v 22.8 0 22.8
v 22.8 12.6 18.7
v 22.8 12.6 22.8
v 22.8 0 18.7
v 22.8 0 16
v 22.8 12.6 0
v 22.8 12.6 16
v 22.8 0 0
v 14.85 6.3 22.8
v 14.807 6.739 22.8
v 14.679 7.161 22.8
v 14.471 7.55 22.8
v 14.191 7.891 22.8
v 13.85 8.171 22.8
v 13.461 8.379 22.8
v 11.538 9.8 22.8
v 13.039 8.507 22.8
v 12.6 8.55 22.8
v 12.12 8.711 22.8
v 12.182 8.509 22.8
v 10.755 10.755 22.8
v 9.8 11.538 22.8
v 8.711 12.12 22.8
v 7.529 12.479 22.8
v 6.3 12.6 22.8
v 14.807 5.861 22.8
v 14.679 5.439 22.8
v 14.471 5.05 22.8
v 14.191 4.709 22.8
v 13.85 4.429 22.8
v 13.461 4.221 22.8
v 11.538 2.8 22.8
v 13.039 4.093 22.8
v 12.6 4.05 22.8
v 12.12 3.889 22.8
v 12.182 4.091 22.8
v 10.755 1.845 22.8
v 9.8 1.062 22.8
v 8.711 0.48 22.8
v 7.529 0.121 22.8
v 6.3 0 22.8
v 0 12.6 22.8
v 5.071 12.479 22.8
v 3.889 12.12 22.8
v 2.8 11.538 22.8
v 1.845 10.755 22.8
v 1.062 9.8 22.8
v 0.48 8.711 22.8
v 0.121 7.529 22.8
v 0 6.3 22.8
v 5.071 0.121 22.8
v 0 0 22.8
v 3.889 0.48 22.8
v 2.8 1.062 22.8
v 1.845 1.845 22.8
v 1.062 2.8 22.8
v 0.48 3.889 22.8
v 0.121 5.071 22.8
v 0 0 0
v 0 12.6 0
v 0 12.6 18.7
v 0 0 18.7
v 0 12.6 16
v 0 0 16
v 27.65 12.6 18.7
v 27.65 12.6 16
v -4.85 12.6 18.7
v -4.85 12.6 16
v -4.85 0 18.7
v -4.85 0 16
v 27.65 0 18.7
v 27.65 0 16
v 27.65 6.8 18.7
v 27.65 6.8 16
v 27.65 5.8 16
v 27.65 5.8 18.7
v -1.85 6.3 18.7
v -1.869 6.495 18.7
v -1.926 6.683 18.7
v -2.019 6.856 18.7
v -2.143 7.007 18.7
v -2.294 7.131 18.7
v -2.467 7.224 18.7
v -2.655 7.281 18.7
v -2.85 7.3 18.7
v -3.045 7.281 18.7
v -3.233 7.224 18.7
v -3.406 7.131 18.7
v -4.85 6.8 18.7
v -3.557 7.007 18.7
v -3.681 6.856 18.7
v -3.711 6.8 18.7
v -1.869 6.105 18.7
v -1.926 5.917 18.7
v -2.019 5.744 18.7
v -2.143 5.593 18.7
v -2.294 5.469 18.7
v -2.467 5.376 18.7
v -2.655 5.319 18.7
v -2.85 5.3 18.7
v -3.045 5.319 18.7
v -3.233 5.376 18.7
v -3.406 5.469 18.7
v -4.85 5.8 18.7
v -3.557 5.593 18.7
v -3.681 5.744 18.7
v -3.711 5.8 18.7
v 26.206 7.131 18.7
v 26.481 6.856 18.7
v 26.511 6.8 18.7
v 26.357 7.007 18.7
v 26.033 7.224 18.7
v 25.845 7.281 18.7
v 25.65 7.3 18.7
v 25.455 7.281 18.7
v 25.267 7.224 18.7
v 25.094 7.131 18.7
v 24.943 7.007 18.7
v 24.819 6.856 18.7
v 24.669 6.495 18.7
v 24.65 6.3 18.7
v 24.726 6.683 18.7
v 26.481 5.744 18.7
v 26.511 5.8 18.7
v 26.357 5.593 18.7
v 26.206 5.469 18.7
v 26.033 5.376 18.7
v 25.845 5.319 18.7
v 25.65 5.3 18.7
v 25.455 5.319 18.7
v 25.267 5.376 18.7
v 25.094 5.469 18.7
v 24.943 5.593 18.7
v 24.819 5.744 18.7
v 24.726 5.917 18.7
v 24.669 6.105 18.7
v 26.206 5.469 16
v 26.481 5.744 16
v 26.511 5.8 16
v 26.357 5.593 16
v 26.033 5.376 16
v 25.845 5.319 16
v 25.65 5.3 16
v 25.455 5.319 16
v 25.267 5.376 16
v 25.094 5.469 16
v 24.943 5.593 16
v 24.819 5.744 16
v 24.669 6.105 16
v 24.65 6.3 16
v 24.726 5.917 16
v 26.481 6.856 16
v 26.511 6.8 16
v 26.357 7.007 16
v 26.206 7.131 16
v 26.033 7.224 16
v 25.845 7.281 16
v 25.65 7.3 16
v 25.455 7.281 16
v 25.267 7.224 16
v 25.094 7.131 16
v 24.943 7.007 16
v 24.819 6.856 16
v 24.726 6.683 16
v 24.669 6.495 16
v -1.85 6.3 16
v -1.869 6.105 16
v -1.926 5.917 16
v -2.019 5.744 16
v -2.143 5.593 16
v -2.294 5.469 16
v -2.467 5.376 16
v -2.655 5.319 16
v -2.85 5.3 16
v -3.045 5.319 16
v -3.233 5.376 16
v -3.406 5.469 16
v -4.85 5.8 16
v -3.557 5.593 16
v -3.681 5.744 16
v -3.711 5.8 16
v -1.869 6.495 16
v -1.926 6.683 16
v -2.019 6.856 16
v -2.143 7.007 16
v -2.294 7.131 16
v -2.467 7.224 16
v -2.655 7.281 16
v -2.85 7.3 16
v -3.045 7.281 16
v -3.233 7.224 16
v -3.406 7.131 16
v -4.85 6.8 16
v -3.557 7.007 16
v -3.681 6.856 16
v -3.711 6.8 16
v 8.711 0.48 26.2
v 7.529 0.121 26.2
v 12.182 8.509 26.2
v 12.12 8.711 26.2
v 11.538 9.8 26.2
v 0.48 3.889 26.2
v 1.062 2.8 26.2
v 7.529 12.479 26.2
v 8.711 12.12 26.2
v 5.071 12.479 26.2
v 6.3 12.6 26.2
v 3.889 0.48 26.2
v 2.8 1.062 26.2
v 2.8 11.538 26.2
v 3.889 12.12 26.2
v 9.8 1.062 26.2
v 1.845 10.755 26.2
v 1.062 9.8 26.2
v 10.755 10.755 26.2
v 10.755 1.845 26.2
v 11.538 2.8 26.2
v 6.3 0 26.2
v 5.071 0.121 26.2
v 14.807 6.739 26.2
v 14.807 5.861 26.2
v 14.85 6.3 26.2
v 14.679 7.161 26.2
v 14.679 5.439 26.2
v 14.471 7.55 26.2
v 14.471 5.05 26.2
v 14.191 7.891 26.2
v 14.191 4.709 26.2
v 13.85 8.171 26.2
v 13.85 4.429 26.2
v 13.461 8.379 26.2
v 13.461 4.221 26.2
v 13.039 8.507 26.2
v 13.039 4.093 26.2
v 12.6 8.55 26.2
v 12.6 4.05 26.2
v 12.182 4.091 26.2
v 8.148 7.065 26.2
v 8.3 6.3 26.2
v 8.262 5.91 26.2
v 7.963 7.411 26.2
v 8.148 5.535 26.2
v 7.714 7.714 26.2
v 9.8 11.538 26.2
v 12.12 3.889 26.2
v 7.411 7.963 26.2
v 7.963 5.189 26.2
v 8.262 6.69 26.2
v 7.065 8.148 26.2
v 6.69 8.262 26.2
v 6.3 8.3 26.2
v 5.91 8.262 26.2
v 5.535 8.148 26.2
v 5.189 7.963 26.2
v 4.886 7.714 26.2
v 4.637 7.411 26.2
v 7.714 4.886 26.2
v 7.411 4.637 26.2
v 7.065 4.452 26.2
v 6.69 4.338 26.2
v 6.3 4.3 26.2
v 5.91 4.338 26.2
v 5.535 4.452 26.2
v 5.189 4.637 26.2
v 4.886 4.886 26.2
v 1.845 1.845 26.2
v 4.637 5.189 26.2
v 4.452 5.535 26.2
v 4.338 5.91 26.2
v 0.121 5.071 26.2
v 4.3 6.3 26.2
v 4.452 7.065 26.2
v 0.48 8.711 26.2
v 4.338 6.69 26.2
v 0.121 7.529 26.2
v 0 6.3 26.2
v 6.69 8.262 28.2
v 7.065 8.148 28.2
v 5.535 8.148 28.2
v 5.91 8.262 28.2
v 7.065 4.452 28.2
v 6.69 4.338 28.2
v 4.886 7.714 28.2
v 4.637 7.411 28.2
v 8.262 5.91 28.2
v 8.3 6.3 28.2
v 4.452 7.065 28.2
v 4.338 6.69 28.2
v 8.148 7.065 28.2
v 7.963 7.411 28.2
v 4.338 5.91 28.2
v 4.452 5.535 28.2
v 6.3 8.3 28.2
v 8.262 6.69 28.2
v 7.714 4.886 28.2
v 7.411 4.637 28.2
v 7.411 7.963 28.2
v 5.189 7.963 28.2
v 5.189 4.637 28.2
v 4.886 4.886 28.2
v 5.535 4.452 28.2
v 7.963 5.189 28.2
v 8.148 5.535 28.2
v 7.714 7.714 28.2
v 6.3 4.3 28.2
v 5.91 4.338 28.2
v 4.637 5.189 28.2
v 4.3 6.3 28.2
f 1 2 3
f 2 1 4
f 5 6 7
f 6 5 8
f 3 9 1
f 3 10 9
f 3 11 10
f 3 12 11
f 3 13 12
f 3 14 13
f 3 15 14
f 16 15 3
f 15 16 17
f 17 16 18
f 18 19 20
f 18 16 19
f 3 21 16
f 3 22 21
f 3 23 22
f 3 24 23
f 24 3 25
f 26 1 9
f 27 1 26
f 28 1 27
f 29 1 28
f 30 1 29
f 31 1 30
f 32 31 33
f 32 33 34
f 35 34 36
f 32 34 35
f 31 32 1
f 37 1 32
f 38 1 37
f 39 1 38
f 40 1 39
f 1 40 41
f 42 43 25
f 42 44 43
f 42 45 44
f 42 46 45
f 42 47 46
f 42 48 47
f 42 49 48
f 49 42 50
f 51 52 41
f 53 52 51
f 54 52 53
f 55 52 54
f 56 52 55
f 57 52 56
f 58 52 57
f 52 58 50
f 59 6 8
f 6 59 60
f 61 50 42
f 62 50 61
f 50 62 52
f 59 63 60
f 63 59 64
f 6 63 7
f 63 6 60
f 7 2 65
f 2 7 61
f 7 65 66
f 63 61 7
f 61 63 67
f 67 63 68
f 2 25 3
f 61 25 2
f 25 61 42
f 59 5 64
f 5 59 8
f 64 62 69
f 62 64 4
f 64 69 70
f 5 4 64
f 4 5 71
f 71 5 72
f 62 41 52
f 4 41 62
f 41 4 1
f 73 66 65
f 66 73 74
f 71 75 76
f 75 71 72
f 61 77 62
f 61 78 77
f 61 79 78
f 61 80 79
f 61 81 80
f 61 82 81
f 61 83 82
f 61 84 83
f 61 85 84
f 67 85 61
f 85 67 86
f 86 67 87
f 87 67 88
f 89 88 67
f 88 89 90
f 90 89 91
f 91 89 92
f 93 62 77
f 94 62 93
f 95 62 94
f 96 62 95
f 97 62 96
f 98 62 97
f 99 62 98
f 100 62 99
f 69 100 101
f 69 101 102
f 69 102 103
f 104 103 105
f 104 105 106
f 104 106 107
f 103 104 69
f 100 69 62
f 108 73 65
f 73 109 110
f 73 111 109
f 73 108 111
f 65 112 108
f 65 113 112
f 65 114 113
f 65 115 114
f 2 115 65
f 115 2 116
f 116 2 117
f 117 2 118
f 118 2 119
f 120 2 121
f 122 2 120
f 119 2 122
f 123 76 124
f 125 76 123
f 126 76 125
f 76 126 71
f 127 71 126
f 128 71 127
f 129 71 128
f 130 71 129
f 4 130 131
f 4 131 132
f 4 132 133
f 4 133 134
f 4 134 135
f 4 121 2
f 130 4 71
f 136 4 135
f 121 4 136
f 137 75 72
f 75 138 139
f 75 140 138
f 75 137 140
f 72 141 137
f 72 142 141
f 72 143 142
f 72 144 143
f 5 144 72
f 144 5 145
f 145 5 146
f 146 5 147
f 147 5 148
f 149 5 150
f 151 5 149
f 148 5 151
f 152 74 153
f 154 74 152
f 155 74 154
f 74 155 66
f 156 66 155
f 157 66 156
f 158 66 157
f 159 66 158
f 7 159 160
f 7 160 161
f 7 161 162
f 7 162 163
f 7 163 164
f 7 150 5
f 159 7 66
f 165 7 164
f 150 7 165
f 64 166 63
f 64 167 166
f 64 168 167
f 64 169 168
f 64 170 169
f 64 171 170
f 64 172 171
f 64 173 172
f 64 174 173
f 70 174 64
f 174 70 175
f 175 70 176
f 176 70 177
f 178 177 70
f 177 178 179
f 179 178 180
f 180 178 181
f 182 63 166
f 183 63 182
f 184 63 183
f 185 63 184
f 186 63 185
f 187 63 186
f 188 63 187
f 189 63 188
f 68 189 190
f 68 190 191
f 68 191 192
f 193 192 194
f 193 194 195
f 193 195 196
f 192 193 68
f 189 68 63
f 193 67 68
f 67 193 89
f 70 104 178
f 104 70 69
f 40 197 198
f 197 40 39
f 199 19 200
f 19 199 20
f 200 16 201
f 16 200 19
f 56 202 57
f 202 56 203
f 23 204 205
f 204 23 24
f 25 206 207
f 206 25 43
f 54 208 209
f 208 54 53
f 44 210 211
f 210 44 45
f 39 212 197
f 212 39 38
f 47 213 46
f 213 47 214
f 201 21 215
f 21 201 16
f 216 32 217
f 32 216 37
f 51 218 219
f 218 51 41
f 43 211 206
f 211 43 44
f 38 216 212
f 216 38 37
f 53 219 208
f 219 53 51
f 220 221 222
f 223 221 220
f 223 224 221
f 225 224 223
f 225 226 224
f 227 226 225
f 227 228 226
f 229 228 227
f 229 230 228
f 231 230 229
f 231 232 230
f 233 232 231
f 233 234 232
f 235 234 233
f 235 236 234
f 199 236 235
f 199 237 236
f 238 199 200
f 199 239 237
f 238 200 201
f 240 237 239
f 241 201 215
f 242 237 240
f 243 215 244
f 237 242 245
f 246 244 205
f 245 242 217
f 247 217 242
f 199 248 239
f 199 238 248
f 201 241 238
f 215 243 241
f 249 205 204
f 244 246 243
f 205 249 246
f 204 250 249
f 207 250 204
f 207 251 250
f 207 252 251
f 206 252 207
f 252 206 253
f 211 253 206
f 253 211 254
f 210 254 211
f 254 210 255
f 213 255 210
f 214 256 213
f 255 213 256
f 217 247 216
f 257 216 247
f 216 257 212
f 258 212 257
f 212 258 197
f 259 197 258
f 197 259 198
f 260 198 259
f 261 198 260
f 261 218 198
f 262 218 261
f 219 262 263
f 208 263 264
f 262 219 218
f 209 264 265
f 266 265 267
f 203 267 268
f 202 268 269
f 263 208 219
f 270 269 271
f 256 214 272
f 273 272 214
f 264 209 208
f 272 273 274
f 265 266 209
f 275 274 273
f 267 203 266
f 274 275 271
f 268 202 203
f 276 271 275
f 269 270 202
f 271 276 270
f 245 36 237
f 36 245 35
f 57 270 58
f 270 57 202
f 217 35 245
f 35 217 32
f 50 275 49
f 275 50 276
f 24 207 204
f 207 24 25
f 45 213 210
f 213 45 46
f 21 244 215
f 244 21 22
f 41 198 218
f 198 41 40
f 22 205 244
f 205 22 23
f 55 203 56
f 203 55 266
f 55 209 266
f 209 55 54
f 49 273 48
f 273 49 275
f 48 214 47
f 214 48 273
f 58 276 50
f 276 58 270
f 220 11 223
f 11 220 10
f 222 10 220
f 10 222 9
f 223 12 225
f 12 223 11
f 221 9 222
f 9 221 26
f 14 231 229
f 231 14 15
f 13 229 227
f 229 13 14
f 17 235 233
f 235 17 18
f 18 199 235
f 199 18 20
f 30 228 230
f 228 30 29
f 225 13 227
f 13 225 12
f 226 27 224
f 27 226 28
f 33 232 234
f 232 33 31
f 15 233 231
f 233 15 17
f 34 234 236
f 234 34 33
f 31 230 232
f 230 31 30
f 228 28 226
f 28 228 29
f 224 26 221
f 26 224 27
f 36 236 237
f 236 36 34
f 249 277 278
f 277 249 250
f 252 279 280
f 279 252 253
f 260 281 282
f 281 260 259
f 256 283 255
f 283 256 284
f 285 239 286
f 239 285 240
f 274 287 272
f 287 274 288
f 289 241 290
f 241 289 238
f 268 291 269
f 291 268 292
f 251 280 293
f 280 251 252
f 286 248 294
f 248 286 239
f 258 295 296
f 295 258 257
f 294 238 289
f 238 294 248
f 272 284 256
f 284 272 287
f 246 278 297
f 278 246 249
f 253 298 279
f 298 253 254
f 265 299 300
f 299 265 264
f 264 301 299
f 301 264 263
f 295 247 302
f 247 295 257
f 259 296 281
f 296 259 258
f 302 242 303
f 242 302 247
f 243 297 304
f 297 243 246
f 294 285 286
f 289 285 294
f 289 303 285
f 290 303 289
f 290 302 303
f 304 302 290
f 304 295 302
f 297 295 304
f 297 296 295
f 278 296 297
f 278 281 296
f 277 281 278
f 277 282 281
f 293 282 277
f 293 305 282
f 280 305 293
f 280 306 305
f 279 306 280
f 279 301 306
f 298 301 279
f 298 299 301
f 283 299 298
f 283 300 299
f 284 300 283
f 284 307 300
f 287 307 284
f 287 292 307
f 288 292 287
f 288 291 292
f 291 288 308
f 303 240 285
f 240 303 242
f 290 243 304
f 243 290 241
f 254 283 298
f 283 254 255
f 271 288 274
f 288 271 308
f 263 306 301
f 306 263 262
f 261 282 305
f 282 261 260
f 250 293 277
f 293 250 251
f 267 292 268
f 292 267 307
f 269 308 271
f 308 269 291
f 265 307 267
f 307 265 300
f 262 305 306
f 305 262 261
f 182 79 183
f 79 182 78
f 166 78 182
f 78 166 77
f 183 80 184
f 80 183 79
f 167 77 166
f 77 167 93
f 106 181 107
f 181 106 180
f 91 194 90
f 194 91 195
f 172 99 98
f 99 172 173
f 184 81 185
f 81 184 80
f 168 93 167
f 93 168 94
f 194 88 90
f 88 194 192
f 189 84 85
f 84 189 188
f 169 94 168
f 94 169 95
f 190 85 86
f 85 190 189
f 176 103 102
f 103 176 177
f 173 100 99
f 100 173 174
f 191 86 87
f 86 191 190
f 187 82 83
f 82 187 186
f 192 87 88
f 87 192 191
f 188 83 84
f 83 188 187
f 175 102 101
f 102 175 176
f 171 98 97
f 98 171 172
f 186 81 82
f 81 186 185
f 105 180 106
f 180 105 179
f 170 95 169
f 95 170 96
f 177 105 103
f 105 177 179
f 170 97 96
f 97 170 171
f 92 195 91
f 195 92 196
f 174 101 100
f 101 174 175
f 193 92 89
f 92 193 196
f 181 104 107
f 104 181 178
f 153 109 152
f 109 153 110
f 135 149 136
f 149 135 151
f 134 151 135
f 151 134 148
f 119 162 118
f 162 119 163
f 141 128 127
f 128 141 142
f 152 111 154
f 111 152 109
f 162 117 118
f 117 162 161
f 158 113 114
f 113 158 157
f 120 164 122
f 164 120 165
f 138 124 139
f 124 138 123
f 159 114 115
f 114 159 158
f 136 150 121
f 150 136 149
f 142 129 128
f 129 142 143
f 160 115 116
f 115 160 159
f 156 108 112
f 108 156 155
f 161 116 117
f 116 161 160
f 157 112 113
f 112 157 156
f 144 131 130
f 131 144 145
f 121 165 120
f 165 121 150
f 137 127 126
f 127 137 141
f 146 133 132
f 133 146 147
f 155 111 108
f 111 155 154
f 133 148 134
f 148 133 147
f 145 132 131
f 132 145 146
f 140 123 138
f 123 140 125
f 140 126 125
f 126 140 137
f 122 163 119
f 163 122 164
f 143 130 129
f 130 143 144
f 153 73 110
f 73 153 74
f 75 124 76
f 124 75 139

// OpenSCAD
// servoSG90(fn) fn = è la definizione delle curve da usare nel render
module servoSG90(fn) {
//    fn=32;
    L = 22.8;
    l = 12.6;
    h = 22.8;
    plateL = 32.5;
    plateH = 2.7;
    plateHPos = 16;
    topCylinderH = 3.4;
    smallTopCylinderD = 4.5;
    
    axisH = 2;
    axisD = 4;
    
    screwHoleCenter=2;
    screwHoleD=2;
    holeSize=1;
    
    difference() {
        union() {
            color("Blue", 0.7) {
                // main part
                cube([L, l, h]);
                // support
                translate([-(plateL - L) / 2, 0, plateHPos])    cube([plateL, l, plateH]);
                // top big cylinder
                translate([l/2,l/2,h])  cylinder(d=l, h=topCylinderH, $fn=fn);
                // top small cylinder
                translate([l, l/2, h])  cylinder(d=smallTopCylinderD, h=topCylinderH, $fn=fn);
            }
            color("white")  translate([l/2,l/2, h + topCylinderH])  cylinder(d=axisD,h=axisH, $fn=fn);
        }
        color("grey", 0.7) {
            // screwHole -
            translate([-(plateL - L) / 2 + screwHoleCenter, l/2, plateHPos])    cylinder(d=screwHoleD, h=10, $fn=fn, center=true);
            translate([-(plateL - L) / 2 - 1, l / 2 - holeSize / 2, plateHPos - 1]) cube([3,holeSize,4]);
            // screwHole +
            translate([plateL - (plateL - L) / 2 - screwHoleCenter, l / 2, plateHPos - 1])  cylinder(d=screwHoleD, h=10, $fn=fn, center=true);
            translate([plateL- (plateL - L) / 2 - screwHoleCenter, l / 2 - holeSize / 2, plateHPos -1]) cube([3,holeSize,4]);
        }
    }
}

servoSG90(32);
